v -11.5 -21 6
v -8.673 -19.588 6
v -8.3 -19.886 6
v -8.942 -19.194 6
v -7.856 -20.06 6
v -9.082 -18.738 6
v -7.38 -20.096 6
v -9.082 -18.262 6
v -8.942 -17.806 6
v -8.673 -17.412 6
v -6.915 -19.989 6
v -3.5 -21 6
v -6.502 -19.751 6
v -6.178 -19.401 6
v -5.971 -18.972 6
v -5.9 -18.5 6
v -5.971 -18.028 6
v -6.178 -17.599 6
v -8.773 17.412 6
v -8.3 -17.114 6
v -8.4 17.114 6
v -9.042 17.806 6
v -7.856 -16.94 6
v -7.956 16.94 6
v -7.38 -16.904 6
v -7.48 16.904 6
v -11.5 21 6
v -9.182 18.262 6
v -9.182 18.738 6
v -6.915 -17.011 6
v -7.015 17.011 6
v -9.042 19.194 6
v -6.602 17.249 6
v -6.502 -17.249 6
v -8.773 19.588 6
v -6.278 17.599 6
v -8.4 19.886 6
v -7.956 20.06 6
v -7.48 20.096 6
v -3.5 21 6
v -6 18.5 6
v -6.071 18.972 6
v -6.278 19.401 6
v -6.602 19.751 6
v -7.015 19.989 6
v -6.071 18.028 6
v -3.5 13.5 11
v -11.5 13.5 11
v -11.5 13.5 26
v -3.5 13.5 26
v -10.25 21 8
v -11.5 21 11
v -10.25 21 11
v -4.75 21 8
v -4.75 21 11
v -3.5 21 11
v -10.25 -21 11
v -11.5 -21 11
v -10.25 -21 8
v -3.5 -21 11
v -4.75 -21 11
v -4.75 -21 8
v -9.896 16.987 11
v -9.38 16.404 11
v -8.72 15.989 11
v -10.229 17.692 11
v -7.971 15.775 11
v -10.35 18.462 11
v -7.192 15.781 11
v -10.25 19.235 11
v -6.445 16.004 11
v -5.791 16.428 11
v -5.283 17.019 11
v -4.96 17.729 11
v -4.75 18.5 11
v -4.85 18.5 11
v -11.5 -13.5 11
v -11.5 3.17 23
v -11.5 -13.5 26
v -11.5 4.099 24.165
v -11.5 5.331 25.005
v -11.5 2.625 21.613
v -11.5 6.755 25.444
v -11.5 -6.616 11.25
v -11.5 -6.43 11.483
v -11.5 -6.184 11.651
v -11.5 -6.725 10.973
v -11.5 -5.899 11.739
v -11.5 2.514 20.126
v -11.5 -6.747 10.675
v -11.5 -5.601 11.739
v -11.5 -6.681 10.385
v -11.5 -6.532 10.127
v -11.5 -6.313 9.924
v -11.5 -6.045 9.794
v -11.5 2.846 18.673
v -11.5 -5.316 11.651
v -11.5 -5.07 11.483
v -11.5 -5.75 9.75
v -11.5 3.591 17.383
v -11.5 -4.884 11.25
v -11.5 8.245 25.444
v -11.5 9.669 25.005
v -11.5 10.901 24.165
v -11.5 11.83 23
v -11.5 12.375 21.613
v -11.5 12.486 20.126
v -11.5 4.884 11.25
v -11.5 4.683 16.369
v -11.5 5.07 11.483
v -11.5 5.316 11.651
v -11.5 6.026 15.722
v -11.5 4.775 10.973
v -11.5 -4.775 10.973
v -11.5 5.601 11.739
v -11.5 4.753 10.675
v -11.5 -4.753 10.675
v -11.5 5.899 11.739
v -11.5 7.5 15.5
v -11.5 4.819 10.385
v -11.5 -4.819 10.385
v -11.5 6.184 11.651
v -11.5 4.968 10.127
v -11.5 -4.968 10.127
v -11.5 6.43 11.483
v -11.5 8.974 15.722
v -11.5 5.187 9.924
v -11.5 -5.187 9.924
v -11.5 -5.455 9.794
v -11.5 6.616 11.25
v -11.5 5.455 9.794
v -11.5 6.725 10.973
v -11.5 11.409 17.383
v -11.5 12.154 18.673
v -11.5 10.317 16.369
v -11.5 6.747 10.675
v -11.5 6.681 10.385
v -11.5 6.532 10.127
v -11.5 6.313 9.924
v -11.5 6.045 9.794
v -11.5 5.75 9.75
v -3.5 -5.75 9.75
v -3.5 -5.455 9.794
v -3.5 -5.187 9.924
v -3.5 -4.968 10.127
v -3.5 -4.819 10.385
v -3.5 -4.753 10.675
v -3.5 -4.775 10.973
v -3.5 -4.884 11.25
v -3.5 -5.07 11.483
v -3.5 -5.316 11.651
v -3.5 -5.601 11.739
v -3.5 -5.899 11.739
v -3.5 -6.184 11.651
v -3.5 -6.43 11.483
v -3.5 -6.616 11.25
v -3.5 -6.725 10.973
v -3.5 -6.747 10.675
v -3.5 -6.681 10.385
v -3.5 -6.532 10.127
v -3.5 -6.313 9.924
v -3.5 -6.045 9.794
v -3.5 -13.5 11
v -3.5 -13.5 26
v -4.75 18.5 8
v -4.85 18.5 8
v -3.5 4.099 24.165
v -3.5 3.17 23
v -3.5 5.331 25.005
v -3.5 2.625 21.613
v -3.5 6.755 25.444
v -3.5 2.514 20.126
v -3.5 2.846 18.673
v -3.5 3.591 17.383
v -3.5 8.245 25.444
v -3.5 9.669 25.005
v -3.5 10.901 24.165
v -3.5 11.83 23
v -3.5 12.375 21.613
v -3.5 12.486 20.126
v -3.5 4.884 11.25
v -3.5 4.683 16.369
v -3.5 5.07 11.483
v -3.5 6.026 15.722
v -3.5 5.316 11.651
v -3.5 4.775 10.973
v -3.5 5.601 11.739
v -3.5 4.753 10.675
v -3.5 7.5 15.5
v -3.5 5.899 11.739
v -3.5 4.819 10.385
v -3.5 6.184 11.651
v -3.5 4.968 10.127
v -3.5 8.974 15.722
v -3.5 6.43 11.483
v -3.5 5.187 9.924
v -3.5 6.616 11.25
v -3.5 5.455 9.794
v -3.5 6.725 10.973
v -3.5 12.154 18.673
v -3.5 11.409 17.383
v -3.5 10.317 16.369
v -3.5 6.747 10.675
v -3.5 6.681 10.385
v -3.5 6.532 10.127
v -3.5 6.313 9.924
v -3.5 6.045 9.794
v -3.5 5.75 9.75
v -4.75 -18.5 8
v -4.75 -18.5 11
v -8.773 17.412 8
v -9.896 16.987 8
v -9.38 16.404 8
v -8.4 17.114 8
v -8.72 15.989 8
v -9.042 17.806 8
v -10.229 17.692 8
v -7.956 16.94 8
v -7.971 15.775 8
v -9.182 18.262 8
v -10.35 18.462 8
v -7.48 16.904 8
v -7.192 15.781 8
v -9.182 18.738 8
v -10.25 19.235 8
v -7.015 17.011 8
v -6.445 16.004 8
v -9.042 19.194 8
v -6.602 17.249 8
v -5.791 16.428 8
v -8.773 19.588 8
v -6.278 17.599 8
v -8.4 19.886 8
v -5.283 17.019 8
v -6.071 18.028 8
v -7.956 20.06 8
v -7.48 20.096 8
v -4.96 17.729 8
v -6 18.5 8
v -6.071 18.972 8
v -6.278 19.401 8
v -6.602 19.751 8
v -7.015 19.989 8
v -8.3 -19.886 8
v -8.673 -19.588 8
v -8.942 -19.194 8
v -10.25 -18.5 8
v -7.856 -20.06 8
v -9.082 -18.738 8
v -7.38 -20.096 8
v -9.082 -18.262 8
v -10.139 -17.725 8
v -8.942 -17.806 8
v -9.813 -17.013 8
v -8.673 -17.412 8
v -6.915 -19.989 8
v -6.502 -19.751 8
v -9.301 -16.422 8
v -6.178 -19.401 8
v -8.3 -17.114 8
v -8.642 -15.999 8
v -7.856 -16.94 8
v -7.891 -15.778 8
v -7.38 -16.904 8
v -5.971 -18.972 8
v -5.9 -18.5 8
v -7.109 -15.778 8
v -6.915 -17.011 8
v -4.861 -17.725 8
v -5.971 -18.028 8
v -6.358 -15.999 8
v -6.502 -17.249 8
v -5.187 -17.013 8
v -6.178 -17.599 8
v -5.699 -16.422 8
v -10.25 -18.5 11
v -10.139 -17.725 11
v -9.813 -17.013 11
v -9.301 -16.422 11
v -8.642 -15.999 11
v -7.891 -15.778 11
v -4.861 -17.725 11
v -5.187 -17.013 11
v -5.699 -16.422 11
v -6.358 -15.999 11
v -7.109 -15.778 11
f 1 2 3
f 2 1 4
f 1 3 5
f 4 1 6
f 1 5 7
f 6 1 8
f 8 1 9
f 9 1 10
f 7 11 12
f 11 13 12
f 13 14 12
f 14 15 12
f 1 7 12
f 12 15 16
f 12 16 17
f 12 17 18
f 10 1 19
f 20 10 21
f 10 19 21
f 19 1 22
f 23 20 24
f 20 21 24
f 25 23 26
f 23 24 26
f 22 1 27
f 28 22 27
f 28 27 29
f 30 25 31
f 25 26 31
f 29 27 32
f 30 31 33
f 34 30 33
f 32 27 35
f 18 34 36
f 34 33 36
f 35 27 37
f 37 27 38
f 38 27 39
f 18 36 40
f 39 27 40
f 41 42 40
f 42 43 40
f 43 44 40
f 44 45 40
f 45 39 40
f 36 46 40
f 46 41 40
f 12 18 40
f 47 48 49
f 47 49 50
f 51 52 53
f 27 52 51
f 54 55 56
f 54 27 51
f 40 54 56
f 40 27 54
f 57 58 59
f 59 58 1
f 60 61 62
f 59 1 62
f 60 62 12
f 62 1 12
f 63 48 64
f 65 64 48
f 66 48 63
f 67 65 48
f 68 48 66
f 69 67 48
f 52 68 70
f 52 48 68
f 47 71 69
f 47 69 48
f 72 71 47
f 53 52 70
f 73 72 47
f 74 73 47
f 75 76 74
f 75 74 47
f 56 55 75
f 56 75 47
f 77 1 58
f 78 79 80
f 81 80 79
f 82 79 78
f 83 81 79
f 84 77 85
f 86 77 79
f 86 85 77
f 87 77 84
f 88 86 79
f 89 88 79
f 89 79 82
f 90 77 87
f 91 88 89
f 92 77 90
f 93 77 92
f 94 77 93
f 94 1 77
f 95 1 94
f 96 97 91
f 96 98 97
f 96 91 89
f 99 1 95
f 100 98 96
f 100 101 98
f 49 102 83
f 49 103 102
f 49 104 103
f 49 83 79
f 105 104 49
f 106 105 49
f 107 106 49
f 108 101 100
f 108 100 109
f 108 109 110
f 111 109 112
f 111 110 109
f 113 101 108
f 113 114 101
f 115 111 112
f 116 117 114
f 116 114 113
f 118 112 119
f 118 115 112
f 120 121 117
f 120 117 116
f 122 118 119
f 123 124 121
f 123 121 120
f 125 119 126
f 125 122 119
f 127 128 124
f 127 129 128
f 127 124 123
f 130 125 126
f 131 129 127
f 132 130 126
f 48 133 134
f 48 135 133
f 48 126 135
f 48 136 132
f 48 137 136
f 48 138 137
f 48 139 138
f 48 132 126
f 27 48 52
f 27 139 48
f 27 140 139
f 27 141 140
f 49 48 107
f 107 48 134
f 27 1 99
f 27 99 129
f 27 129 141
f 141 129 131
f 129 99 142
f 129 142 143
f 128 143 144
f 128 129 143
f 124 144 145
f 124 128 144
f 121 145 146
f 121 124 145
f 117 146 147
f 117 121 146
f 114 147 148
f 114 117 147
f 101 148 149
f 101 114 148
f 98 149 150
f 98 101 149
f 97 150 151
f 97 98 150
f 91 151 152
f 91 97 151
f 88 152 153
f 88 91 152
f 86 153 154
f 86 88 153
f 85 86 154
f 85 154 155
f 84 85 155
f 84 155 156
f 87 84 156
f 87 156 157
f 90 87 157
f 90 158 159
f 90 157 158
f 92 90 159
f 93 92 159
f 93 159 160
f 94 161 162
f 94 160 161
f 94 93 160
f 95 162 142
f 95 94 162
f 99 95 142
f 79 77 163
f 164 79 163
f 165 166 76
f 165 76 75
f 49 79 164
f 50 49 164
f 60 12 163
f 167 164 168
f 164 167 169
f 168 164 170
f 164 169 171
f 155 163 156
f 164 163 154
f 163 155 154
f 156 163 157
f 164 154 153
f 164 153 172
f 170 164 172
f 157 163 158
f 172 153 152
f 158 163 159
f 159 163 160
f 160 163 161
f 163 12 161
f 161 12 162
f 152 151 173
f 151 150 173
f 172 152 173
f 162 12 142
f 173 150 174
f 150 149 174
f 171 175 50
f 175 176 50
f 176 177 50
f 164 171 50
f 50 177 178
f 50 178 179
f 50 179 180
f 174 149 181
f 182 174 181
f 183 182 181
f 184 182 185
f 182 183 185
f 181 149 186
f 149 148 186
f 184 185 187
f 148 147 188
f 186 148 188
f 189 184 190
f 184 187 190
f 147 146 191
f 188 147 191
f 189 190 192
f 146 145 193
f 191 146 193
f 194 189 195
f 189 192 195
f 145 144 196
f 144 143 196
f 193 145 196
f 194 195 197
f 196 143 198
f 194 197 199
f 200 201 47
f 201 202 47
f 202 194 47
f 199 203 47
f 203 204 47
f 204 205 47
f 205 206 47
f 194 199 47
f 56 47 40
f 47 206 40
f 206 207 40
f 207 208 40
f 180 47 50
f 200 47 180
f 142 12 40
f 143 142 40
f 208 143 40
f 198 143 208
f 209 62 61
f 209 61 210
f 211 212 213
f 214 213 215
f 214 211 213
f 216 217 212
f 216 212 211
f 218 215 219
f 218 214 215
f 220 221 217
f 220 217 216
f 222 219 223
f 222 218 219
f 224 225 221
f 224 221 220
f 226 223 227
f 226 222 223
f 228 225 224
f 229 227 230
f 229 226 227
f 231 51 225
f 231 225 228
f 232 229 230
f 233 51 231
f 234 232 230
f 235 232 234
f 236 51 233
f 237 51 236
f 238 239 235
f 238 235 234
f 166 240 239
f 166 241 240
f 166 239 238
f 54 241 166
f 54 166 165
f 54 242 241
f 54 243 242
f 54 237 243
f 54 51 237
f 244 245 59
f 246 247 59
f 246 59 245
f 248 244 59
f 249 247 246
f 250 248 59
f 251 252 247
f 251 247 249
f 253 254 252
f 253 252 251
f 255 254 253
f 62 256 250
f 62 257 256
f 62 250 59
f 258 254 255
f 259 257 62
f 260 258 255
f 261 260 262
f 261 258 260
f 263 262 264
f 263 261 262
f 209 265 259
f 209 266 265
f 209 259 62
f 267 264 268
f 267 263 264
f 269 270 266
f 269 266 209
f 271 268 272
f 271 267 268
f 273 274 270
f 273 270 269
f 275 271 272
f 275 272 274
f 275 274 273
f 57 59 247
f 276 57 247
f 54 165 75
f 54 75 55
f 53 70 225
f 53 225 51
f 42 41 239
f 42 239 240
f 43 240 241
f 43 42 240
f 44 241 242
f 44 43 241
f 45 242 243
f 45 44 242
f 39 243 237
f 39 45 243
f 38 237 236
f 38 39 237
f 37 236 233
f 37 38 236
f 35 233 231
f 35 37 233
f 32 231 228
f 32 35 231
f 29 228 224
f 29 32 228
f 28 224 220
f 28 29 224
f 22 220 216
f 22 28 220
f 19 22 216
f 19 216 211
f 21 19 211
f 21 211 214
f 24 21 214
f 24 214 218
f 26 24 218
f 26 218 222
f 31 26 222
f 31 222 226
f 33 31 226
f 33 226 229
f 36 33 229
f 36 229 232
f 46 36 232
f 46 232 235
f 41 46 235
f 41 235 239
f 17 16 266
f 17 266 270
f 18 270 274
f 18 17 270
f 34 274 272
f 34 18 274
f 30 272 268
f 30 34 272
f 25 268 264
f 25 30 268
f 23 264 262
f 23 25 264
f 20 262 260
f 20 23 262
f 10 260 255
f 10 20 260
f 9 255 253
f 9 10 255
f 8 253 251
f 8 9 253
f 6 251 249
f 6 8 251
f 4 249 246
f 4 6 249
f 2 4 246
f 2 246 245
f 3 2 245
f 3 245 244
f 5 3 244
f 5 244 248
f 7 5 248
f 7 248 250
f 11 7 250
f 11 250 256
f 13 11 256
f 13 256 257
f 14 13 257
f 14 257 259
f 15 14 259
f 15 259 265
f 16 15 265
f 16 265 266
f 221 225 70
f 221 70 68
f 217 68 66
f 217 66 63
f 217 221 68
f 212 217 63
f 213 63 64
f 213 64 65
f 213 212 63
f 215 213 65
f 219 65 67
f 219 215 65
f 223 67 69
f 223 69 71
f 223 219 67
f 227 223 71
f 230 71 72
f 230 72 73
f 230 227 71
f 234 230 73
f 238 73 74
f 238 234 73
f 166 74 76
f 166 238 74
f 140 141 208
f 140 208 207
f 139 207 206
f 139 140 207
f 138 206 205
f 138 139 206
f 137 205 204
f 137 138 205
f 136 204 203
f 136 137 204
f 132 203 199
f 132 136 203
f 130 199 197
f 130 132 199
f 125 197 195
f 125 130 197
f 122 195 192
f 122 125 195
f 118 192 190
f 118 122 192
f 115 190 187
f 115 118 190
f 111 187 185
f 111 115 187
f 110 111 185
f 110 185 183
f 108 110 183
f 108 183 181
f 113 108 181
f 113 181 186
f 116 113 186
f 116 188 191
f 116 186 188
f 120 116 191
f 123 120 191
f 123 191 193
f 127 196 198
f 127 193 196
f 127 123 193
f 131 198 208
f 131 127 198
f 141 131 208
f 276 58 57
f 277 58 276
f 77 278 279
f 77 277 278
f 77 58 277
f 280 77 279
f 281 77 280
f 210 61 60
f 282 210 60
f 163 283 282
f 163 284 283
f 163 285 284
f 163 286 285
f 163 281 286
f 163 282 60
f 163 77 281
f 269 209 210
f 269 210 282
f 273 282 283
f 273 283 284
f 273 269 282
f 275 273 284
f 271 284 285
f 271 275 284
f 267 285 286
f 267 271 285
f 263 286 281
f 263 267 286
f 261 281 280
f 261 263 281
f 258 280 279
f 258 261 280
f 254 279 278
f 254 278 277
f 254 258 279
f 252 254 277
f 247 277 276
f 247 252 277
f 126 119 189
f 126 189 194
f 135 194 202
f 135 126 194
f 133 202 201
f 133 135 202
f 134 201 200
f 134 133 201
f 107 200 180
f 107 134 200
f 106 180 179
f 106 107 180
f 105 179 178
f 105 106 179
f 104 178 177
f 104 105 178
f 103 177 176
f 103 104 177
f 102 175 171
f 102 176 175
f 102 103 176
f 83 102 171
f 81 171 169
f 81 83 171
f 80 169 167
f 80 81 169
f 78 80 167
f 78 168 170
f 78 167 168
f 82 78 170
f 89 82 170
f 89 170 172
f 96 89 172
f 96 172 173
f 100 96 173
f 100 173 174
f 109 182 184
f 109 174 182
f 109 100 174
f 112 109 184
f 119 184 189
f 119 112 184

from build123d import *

# Parameters (mm, degrees)
CYLINDER033_R     = 1
CYLINDER033_DEPTH = 20
CYLINDER032_R     = 1
CYLINDER032_DEPTH = 20
CYLINDER012_R     = 5
CYLINDER012_DEPTH = 10
BOX003_W          = 8
BOX003_H          = 27
BOX003_DEPTH      = 20
BOX002_W          = 5.5
BOX002_H          = 5.5
BOX002_DEPTH      = 3
CYLINDER002_R     = 1.6
CYLINDER002_DEPTH = 5
CYLINDER003_R     = 2.75
CYLINDER003_DEPTH = 3
BOX001_W          = 5.5
BOX001_H          = 5.5
BOX001_DEPTH      = 3
CYLINDER_R        = 1.6
CYLINDER_DEPTH    = 5
CYLINDER001_R     = 2.75
CYLINDER001_DEPTH = 3
BOX_W             = 8
BOX_H             = 42
BOX_DEPTH         = 5


with BuildPart() as cylinder033:
    # Cylinder033 → Cylinder033 (new body)
    with BuildSketch(Plane(origin=(-15, 5.75, 9.75), x_dir=(0, 0, -1), z_dir=(1, 0, 0))):
        Circle(CYLINDER033_R)
    extrude(amount=CYLINDER033_DEPTH)


with BuildPart() as fusion020:
    # Cylinder032 → Cylinder032 (new body)
    with BuildSketch(Plane(origin=(-15, -5.75, 9.75), x_dir=(0, 0, -1), z_dir=(1, 0, 0))):
        Circle(CYLINDER032_R)
    extrude(amount=CYLINDER032_DEPTH)

    # Fusion020: union Cylinder033
    add(cylinder033.part)


with BuildPart() as cylinder012:
    # Cylinder012 → Cylinder012 (new body)
    with BuildSketch(Plane(origin=(-12.5, 7.5, 19.5), x_dir=(0, 0, -1), z_dir=(1, 0, 0))):
        Circle(CYLINDER012_R)
    extrude(amount=CYLINDER012_DEPTH)


with BuildPart() as cube003:
    # Box003 → Box003 (new body)
    with BuildSketch(Plane(origin=(-11.5, -13.5, 5), x_dir=(1, 0, 0), z_dir=(0, 0, 1))):
        with Locations((4, 13.5)):
            Rectangle(BOX003_W, BOX003_H)
    extrude(amount=BOX003_DEPTH)


with BuildPart() as cube002:
    # Box002 → Box002 (new body)
    with BuildSketch(Plane(origin=(-10.25, -24, 7), x_dir=(1, 0, 0), z_dir=(0, 0, 1))):
        with Locations((2.75, 2.75)):
            Rectangle(BOX002_W, BOX002_H)
    extrude(amount=BOX002_DEPTH)


with BuildPart() as cylinder002:
    # Cylinder002 → Cylinder002 (new body)
    with BuildSketch(Plane.XY):
        Circle(CYLINDER002_R)
    extrude(amount=CYLINDER002_DEPTH)


with BuildPart() as fusion003:
    # Cylinder003 → Cylinder003 (new body)
    with BuildSketch(Plane.XY.offset(2)):
        Circle(CYLINDER003_R)
    extrude(amount=CYLINDER003_DEPTH)

    # Fusion001: union Cylinder002
    add(cylinder002.part)


with BuildPart() as fusion003_1:
    # Fusion001 placement: moved
    add(fusion003.part.moved(Location((-7.5, -18.5, 5))))

    # Fusion003: union Cube002
    add(cube002.part)


with BuildPart() as cube001:
    # Box001 → Box001 (new body)
    with BuildSketch(Plane(origin=(-10.25, 18.5, 7), x_dir=(1, 0, 0), z_dir=(0, 0, 1))):
        with Locations((2.75, 2.75)):
            Rectangle(BOX001_W, BOX001_H)
    extrude(amount=BOX001_DEPTH)


with BuildPart() as cylinder:
    # Cylinder → Cylinder (new body)
    with BuildSketch(Plane.XY):
        Circle(CYLINDER_R)
    extrude(amount=CYLINDER_DEPTH)


with BuildPart() as fusion004:
    # Cylinder001 → Cylinder001 (new body)
    with BuildSketch(Plane.XY.offset(2)):
        Circle(CYLINDER001_R)
    extrude(amount=CYLINDER001_DEPTH)

    # Fusion: union Cylinder
    add(cylinder.part)


with BuildPart() as fusion004_1:
    # Fusion placement: moved
    add(fusion004.part.moved(Location((-7.6, 18.5, 5))))

    # Fusion002: union Cube001
    add(cube001.part)

    # Fusion004: union Fusion003
    add(fusion003_1.part)


with BuildPart() as holder:
    # Box → Box (new body)
    with BuildSketch(Plane(origin=(-11.5, -21, 5), x_dir=(1, 0, 0), z_dir=(0, 0, 1))):
        with Locations((4, 21)):
            Rectangle(BOX_W, BOX_H)
    extrude(amount=BOX_DEPTH)

    # Cut: cut Fusion004
    add(fusion004_1.part, mode=Mode.SUBTRACT)

    # Fusion005: union Cube003
    add(cube003.part)

    # Cut002: cut Cylinder012
    add(cylinder012.part, mode=Mode.SUBTRACT)

    # Cut009: cut Fusion020
    add(fusion020.part, mode=Mode.SUBTRACT)


with BuildPart() as holder_1:
    # Cut009 placement: moved
    add(holder.part.moved(Location((0, 0, 1))))


solid = holder_1.part
